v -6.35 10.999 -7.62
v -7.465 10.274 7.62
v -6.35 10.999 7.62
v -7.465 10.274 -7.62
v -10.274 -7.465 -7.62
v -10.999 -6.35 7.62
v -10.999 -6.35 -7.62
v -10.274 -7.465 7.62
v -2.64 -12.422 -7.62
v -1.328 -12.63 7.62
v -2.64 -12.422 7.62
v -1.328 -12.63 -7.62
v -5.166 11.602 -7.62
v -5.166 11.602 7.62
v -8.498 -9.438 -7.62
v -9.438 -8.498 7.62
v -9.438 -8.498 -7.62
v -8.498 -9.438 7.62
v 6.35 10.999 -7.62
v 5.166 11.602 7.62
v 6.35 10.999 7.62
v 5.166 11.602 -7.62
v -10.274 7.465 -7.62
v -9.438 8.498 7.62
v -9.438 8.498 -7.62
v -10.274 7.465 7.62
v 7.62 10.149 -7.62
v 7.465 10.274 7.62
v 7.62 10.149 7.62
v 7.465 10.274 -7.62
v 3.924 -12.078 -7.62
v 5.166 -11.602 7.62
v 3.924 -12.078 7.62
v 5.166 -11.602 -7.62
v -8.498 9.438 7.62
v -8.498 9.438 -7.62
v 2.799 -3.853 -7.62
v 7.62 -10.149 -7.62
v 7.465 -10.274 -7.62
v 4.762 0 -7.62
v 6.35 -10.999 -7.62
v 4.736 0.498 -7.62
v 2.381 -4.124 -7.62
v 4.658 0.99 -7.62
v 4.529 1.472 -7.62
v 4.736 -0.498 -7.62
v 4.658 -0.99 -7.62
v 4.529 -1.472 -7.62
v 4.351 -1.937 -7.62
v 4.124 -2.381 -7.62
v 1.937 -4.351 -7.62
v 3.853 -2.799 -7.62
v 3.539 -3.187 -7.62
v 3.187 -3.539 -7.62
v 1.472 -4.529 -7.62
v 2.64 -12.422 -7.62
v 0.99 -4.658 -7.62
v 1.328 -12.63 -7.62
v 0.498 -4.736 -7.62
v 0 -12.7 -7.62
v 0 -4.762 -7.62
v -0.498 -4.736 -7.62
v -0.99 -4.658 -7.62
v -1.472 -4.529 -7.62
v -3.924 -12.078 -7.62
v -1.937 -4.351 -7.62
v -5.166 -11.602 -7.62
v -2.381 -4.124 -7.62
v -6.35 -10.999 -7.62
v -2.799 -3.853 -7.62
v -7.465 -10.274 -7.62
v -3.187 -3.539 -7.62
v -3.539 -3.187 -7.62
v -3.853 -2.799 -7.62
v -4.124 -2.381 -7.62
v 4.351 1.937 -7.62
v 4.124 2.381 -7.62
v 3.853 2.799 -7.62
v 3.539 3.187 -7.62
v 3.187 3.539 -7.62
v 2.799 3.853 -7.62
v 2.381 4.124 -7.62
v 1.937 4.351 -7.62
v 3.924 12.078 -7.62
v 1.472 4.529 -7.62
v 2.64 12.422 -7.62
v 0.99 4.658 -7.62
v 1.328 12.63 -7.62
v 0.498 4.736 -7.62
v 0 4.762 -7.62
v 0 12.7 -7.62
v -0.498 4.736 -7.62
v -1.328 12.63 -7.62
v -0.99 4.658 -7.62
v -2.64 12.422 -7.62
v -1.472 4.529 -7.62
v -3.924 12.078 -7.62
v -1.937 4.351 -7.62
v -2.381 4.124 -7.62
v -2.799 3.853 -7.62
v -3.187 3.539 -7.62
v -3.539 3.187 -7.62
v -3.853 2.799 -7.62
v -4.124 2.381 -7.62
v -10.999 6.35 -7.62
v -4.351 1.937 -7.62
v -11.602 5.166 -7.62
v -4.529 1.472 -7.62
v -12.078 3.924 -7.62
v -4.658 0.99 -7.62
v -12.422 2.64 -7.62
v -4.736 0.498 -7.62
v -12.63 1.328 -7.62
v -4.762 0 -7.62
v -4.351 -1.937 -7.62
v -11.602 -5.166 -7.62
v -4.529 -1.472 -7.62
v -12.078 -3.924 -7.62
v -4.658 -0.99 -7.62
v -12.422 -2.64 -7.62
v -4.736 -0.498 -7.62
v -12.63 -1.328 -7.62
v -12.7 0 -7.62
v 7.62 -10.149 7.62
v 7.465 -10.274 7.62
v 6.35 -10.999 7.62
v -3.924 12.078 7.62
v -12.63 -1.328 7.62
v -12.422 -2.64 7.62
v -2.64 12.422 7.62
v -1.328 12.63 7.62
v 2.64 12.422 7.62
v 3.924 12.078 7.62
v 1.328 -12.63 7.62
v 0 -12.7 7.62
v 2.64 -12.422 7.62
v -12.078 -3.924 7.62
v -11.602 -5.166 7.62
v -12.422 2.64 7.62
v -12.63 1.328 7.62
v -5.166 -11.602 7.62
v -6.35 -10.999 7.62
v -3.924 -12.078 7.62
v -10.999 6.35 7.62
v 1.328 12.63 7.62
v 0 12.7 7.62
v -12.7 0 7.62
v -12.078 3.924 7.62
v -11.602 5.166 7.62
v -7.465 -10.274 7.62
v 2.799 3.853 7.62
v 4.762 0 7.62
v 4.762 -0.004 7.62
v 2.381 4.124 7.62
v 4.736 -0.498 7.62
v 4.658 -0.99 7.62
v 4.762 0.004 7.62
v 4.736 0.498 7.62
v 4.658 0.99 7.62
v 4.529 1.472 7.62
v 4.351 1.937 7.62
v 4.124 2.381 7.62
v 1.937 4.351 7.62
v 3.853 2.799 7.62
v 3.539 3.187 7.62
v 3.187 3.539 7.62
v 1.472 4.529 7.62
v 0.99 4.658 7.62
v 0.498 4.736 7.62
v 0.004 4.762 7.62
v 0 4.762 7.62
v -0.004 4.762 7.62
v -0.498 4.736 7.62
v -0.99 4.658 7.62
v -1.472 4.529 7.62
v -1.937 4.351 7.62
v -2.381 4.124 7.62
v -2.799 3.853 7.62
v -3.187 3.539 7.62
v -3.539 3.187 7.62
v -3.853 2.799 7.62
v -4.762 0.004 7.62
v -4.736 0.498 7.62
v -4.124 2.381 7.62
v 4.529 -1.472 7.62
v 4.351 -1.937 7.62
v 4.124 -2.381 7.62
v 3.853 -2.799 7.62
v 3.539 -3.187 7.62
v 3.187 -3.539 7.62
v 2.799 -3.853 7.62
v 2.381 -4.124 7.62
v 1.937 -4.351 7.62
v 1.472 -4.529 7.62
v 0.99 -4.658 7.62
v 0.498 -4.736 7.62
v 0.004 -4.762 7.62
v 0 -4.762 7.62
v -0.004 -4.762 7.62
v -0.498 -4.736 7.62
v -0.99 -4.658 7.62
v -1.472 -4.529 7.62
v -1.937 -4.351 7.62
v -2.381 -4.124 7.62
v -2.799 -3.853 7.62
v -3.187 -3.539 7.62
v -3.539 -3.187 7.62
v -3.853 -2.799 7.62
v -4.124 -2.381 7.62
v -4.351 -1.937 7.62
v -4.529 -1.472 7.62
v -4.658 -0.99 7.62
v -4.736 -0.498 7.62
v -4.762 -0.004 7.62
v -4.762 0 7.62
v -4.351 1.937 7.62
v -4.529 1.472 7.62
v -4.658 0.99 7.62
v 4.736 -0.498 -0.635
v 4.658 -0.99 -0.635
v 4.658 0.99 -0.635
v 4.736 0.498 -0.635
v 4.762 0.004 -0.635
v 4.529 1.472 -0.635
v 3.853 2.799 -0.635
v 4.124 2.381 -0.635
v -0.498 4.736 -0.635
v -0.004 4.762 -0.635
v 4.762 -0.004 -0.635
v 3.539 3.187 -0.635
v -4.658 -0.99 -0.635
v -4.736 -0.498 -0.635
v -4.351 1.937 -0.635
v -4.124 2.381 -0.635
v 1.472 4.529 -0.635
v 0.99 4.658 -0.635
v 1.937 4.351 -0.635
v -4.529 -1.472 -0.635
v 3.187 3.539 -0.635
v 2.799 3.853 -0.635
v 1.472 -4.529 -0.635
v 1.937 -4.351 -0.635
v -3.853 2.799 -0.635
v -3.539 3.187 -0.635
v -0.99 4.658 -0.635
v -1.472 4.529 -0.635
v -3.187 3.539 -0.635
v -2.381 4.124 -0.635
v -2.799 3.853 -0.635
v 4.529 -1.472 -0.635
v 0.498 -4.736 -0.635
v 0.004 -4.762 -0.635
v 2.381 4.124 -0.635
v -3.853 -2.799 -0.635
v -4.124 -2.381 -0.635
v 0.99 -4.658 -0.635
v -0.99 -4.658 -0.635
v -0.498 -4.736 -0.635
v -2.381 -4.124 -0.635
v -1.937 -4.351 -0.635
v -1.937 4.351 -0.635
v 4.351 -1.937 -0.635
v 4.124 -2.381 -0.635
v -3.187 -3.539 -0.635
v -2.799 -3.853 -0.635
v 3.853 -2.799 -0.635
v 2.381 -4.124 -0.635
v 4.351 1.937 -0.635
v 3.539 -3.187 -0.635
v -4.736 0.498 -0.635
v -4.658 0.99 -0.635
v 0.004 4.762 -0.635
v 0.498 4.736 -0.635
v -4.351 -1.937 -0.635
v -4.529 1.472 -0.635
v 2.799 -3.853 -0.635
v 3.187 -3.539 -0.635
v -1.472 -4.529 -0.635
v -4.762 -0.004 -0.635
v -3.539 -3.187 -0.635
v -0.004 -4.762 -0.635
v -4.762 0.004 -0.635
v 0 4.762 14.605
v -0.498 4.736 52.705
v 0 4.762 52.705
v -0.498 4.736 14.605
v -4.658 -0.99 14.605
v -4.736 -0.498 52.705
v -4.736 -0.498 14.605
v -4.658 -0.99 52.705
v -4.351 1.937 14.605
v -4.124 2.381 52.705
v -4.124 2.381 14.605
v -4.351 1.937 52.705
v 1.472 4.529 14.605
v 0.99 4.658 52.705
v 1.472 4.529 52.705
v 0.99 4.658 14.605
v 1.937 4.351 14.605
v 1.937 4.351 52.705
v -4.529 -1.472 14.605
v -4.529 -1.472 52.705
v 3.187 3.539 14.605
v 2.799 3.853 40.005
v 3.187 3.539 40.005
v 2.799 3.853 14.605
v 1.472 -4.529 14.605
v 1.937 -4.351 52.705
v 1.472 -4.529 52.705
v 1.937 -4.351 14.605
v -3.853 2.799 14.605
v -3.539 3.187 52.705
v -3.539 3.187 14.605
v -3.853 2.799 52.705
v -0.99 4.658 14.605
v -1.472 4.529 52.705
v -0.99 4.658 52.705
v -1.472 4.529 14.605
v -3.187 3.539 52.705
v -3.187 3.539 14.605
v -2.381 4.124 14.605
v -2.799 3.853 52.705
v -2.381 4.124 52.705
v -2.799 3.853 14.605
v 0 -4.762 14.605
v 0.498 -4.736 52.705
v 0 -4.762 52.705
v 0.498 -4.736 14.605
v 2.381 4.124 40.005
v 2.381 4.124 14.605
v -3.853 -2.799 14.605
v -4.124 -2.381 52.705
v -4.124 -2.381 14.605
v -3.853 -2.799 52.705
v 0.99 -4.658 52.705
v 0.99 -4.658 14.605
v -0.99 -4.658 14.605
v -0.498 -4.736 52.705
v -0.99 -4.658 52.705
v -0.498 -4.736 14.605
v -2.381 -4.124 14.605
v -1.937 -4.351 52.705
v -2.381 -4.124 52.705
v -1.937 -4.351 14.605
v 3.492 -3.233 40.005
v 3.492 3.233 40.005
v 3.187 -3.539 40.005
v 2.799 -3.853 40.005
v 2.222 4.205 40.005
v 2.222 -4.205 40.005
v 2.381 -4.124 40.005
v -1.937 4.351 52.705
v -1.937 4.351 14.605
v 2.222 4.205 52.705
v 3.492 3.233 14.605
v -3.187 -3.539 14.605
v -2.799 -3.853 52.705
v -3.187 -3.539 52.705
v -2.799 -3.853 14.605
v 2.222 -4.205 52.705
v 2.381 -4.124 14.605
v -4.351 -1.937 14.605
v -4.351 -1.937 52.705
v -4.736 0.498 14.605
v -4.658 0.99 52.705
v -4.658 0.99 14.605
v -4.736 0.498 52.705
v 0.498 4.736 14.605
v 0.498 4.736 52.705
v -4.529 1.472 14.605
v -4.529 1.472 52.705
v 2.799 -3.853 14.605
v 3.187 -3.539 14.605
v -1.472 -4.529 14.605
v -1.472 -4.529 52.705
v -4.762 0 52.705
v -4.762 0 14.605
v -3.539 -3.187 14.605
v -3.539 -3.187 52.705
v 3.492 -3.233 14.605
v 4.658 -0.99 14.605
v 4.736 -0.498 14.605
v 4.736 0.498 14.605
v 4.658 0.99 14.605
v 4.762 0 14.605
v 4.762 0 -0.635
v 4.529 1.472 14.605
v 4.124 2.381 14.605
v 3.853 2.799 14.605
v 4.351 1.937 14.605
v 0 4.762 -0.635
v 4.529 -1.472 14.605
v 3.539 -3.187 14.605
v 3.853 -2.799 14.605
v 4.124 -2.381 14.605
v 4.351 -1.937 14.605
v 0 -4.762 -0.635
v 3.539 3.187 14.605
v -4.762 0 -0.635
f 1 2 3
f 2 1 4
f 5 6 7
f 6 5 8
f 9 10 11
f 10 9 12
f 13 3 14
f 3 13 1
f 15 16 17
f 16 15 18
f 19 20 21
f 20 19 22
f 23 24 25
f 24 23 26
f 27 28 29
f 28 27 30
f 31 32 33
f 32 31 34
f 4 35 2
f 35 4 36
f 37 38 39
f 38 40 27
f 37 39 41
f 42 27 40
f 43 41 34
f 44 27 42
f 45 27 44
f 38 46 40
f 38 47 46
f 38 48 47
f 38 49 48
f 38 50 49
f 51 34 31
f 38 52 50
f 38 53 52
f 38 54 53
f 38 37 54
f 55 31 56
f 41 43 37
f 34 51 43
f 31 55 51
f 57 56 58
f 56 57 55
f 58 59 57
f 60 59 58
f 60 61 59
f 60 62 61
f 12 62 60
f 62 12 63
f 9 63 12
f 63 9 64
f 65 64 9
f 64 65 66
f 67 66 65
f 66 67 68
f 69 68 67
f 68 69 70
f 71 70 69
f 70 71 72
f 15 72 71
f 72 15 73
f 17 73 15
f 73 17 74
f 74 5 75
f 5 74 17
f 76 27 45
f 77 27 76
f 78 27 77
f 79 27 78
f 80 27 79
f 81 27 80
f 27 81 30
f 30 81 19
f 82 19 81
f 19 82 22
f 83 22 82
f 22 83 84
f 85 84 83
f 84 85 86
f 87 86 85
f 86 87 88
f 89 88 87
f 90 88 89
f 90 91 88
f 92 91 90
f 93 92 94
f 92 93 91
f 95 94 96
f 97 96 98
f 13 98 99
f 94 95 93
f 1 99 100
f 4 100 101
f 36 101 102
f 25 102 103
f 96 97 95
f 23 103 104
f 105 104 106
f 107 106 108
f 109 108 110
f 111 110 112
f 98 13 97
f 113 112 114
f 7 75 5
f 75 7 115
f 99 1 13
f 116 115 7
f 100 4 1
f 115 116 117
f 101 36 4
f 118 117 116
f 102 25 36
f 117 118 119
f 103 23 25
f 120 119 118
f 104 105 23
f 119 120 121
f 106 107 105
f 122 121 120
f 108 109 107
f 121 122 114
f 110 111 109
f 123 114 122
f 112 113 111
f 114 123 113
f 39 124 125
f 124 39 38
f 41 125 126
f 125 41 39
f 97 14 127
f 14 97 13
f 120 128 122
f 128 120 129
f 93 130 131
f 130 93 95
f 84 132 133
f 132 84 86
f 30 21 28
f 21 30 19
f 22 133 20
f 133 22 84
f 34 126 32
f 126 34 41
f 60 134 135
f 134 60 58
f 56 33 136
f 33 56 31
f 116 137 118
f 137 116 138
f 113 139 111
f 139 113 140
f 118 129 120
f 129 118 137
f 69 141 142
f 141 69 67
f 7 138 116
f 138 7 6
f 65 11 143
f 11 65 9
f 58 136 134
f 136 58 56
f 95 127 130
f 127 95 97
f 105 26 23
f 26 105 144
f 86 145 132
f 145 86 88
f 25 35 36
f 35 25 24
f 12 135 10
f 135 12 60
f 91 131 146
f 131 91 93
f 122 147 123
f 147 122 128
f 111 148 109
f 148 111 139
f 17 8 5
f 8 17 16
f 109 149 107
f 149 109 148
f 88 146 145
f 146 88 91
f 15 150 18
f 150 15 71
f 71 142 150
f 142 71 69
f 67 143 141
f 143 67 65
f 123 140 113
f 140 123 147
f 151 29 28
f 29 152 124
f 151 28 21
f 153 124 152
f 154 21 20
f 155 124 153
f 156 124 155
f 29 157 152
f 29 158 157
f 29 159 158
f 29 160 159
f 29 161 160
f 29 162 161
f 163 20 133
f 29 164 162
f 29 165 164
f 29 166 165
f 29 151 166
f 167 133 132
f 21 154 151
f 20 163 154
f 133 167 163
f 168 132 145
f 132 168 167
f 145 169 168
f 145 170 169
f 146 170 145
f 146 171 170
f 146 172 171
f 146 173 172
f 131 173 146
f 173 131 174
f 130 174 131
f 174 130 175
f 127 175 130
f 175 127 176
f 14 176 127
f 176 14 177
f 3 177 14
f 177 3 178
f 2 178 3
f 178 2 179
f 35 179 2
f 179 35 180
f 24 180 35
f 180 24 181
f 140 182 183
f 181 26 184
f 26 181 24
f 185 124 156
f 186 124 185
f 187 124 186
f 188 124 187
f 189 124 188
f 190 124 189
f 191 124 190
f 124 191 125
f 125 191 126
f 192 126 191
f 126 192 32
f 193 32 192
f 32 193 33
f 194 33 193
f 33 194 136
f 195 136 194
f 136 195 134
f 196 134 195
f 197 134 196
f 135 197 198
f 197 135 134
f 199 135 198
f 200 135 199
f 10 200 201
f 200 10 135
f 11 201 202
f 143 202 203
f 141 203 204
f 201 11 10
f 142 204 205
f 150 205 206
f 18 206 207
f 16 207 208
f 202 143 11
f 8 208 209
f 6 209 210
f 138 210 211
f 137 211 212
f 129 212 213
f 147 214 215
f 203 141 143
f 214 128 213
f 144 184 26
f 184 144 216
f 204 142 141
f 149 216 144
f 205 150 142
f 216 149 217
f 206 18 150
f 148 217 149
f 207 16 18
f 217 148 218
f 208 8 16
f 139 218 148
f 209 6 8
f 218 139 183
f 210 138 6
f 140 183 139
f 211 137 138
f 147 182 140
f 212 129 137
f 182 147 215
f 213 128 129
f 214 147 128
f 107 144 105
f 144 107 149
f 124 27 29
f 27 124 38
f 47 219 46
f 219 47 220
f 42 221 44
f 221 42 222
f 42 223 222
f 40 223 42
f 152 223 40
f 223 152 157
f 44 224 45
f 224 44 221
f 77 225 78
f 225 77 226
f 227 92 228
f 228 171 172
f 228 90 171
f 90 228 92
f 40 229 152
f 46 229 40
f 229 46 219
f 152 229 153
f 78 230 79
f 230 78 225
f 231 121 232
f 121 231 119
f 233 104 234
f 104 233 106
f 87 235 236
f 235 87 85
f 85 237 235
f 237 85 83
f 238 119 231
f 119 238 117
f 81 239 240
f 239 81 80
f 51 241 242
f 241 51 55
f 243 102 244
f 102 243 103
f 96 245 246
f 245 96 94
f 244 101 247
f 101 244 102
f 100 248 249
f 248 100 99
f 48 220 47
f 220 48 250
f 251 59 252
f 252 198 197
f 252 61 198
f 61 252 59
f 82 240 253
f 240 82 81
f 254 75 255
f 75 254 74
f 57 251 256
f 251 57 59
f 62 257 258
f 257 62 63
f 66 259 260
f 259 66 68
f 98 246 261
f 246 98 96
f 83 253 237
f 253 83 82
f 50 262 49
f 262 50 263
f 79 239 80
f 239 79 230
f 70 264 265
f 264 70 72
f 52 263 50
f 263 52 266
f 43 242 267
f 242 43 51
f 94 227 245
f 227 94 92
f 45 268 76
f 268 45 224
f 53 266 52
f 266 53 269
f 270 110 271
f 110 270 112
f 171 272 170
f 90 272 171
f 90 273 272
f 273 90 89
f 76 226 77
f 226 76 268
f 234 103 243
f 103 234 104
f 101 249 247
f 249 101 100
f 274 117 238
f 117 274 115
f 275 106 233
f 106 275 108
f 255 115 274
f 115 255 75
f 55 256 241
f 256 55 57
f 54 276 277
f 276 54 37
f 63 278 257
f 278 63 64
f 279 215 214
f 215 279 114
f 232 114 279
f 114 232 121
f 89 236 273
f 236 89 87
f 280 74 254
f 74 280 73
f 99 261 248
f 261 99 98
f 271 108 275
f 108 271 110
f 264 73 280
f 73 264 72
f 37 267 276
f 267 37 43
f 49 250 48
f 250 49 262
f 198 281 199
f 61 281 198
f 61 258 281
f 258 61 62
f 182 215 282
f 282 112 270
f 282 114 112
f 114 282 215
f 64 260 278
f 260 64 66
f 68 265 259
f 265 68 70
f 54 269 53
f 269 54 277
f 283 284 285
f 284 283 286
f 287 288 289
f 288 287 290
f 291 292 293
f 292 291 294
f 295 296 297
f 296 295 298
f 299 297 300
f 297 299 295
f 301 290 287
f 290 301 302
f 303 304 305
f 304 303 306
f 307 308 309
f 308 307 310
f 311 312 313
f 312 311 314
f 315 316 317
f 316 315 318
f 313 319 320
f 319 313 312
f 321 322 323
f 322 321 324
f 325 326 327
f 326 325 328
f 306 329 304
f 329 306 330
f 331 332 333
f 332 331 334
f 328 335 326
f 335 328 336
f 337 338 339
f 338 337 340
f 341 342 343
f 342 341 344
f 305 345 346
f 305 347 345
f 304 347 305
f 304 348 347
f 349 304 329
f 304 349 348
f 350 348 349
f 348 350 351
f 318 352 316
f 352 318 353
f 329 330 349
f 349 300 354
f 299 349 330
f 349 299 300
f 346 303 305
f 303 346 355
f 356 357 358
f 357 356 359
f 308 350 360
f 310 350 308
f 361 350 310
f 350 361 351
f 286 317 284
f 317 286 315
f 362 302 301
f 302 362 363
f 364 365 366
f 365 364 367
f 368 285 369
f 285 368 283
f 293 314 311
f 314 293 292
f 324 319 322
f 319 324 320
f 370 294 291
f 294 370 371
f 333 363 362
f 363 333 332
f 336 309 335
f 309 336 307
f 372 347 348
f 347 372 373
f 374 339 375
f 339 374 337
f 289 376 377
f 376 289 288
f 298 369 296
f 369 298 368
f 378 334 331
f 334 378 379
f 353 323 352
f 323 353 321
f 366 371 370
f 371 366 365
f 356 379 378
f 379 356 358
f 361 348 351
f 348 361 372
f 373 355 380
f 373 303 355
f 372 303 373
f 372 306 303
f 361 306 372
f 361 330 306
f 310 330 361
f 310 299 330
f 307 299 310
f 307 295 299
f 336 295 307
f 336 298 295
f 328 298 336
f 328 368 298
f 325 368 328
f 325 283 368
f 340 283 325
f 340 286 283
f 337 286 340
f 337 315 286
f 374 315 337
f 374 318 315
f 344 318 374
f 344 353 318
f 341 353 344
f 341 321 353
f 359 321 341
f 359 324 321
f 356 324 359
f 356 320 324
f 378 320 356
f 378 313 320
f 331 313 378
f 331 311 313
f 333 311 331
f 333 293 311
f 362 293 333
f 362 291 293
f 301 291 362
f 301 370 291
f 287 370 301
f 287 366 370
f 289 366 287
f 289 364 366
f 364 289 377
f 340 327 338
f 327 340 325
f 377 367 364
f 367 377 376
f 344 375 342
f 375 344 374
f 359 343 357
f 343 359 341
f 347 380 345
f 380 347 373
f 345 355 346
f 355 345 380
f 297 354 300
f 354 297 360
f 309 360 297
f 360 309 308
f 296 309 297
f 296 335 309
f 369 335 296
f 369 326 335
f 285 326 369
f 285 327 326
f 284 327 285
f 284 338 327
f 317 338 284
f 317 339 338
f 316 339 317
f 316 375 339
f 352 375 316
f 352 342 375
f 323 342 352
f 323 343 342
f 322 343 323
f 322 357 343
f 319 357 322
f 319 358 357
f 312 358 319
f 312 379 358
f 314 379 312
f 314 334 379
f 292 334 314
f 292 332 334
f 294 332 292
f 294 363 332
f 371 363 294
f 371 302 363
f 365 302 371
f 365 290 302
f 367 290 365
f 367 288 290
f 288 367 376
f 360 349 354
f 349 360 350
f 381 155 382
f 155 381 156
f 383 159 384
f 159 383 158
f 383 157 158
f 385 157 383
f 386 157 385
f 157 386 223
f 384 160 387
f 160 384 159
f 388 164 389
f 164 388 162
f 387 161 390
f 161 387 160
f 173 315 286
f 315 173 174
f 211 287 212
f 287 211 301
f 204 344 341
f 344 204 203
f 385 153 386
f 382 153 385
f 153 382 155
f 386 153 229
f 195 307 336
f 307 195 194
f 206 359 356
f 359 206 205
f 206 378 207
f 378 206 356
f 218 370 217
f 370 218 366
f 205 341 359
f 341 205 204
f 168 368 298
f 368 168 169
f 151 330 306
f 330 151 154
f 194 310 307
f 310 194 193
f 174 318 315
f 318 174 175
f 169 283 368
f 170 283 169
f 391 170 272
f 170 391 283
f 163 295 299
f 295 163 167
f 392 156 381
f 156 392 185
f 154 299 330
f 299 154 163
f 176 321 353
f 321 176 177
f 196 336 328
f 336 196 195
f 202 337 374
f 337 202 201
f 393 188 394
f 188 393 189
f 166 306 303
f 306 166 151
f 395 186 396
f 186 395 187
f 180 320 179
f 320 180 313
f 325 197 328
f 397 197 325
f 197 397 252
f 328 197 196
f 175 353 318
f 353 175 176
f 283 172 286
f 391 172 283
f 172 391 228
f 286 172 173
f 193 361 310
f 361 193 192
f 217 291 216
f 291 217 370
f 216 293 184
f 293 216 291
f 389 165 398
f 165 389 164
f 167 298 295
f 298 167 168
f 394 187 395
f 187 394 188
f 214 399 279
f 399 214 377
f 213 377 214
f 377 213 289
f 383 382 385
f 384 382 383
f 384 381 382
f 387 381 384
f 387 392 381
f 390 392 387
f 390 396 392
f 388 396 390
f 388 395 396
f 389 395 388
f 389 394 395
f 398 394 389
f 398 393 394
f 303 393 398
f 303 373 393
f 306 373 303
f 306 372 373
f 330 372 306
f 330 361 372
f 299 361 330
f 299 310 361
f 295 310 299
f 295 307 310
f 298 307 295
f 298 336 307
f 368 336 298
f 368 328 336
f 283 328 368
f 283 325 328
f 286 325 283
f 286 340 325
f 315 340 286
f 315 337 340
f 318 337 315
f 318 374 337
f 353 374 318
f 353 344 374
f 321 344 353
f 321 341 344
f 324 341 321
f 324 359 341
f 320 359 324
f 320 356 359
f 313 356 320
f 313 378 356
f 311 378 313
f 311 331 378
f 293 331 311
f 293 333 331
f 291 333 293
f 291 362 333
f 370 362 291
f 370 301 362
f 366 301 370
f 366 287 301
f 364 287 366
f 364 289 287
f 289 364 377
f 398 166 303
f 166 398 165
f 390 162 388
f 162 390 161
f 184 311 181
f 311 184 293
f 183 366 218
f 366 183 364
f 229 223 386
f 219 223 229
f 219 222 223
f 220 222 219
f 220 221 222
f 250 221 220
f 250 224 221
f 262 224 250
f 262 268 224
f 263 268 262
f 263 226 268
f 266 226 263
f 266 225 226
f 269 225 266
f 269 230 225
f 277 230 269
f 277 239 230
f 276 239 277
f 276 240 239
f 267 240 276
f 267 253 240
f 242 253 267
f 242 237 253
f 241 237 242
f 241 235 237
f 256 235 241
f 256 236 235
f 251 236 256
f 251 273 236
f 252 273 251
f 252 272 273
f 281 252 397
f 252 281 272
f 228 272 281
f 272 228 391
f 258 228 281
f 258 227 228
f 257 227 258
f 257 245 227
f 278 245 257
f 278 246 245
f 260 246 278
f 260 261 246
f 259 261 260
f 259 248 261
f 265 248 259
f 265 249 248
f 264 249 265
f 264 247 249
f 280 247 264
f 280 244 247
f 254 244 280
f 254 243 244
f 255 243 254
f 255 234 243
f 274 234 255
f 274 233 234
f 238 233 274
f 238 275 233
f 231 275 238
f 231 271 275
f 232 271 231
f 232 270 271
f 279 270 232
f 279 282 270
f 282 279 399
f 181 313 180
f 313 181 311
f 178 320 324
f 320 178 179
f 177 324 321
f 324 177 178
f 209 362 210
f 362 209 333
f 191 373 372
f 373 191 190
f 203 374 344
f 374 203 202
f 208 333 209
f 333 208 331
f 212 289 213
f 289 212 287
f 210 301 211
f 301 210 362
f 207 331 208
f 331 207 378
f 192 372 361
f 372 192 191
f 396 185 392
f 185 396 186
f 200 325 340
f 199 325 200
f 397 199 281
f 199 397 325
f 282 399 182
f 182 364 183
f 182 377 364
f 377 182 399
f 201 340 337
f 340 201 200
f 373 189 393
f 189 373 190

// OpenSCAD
baseH=.6;
baseD=1;
baseholeD=.375;
cutaway=.2;
    
stemD=baseholeD;
stem1H=.5;
stem2H=1;
stem3H=baseH;
cutaway1=.1;
cutaway2=.05;

//model is in inches
res=60;
//distance from table to laser carriage (min=stem2H+stem3H)
laser=1.875;
//minimum height adj - none
minmove=stem2H+stem3H;
//print the base part, enter 1 or 0
printbase=1;
//print the stem part, enter 1 or 0
printstem=1;

    
module base(){

    scale([25.4,25.4,25.4])
    difference(){
        difference(){
            cylinder(h=baseH, d=baseD, center=true, $fn=res);
            translate([(.5*baseD-.5*cutaway),0,0]) cube([cutaway,baseD,baseH], center=true);
    }
        
        cylinder(h=baseH, d=baseholeD, center=true, $fn=res);
}
}

if (printbase==1)
    base();
else if (printbase==0)
    echo("NOT PRINTING BASE");

module stem(){
  
    scale([25.4,25.4,25.4])
    cylinder(h=stem3H, d=stemD, center=true, $fn=res);
    
    scale([25.4,25.4,25.4])
    translate([0,0,(.5*stem3H+.5*stem2H)]) 
    difference(){
        cylinder(h=stem2H, d=stemD, center=true, $fn=res);
        translate([(.5*stemD-.5*cutaway2),0,0]) cube([cutaway2,stemD,stem2H], center=true);
    }
    
    scale([25.4,25.4,25.4])
    translate([0,0,(.5*stem1H+stem2H+.5*stem3H)]) 
    difference(){
        cylinder(h=stem1H, d=stemD, center=true, $fn=res);
        translate([(.5*stemD-.5*cutaway1),0,0]) cube([cutaway1,stemD,stem1H], center=true);
    }
}   

if (printstem==1)
    if (laser>=(minmove))
    translate([0,0,25.4*(laser-(stem3H+stem2H))])
    stem();
    else echo("Must be larger or equal to stem2H + stem3H");
else if (printstem==0)
    echo("NOT PRINTING STEM");
